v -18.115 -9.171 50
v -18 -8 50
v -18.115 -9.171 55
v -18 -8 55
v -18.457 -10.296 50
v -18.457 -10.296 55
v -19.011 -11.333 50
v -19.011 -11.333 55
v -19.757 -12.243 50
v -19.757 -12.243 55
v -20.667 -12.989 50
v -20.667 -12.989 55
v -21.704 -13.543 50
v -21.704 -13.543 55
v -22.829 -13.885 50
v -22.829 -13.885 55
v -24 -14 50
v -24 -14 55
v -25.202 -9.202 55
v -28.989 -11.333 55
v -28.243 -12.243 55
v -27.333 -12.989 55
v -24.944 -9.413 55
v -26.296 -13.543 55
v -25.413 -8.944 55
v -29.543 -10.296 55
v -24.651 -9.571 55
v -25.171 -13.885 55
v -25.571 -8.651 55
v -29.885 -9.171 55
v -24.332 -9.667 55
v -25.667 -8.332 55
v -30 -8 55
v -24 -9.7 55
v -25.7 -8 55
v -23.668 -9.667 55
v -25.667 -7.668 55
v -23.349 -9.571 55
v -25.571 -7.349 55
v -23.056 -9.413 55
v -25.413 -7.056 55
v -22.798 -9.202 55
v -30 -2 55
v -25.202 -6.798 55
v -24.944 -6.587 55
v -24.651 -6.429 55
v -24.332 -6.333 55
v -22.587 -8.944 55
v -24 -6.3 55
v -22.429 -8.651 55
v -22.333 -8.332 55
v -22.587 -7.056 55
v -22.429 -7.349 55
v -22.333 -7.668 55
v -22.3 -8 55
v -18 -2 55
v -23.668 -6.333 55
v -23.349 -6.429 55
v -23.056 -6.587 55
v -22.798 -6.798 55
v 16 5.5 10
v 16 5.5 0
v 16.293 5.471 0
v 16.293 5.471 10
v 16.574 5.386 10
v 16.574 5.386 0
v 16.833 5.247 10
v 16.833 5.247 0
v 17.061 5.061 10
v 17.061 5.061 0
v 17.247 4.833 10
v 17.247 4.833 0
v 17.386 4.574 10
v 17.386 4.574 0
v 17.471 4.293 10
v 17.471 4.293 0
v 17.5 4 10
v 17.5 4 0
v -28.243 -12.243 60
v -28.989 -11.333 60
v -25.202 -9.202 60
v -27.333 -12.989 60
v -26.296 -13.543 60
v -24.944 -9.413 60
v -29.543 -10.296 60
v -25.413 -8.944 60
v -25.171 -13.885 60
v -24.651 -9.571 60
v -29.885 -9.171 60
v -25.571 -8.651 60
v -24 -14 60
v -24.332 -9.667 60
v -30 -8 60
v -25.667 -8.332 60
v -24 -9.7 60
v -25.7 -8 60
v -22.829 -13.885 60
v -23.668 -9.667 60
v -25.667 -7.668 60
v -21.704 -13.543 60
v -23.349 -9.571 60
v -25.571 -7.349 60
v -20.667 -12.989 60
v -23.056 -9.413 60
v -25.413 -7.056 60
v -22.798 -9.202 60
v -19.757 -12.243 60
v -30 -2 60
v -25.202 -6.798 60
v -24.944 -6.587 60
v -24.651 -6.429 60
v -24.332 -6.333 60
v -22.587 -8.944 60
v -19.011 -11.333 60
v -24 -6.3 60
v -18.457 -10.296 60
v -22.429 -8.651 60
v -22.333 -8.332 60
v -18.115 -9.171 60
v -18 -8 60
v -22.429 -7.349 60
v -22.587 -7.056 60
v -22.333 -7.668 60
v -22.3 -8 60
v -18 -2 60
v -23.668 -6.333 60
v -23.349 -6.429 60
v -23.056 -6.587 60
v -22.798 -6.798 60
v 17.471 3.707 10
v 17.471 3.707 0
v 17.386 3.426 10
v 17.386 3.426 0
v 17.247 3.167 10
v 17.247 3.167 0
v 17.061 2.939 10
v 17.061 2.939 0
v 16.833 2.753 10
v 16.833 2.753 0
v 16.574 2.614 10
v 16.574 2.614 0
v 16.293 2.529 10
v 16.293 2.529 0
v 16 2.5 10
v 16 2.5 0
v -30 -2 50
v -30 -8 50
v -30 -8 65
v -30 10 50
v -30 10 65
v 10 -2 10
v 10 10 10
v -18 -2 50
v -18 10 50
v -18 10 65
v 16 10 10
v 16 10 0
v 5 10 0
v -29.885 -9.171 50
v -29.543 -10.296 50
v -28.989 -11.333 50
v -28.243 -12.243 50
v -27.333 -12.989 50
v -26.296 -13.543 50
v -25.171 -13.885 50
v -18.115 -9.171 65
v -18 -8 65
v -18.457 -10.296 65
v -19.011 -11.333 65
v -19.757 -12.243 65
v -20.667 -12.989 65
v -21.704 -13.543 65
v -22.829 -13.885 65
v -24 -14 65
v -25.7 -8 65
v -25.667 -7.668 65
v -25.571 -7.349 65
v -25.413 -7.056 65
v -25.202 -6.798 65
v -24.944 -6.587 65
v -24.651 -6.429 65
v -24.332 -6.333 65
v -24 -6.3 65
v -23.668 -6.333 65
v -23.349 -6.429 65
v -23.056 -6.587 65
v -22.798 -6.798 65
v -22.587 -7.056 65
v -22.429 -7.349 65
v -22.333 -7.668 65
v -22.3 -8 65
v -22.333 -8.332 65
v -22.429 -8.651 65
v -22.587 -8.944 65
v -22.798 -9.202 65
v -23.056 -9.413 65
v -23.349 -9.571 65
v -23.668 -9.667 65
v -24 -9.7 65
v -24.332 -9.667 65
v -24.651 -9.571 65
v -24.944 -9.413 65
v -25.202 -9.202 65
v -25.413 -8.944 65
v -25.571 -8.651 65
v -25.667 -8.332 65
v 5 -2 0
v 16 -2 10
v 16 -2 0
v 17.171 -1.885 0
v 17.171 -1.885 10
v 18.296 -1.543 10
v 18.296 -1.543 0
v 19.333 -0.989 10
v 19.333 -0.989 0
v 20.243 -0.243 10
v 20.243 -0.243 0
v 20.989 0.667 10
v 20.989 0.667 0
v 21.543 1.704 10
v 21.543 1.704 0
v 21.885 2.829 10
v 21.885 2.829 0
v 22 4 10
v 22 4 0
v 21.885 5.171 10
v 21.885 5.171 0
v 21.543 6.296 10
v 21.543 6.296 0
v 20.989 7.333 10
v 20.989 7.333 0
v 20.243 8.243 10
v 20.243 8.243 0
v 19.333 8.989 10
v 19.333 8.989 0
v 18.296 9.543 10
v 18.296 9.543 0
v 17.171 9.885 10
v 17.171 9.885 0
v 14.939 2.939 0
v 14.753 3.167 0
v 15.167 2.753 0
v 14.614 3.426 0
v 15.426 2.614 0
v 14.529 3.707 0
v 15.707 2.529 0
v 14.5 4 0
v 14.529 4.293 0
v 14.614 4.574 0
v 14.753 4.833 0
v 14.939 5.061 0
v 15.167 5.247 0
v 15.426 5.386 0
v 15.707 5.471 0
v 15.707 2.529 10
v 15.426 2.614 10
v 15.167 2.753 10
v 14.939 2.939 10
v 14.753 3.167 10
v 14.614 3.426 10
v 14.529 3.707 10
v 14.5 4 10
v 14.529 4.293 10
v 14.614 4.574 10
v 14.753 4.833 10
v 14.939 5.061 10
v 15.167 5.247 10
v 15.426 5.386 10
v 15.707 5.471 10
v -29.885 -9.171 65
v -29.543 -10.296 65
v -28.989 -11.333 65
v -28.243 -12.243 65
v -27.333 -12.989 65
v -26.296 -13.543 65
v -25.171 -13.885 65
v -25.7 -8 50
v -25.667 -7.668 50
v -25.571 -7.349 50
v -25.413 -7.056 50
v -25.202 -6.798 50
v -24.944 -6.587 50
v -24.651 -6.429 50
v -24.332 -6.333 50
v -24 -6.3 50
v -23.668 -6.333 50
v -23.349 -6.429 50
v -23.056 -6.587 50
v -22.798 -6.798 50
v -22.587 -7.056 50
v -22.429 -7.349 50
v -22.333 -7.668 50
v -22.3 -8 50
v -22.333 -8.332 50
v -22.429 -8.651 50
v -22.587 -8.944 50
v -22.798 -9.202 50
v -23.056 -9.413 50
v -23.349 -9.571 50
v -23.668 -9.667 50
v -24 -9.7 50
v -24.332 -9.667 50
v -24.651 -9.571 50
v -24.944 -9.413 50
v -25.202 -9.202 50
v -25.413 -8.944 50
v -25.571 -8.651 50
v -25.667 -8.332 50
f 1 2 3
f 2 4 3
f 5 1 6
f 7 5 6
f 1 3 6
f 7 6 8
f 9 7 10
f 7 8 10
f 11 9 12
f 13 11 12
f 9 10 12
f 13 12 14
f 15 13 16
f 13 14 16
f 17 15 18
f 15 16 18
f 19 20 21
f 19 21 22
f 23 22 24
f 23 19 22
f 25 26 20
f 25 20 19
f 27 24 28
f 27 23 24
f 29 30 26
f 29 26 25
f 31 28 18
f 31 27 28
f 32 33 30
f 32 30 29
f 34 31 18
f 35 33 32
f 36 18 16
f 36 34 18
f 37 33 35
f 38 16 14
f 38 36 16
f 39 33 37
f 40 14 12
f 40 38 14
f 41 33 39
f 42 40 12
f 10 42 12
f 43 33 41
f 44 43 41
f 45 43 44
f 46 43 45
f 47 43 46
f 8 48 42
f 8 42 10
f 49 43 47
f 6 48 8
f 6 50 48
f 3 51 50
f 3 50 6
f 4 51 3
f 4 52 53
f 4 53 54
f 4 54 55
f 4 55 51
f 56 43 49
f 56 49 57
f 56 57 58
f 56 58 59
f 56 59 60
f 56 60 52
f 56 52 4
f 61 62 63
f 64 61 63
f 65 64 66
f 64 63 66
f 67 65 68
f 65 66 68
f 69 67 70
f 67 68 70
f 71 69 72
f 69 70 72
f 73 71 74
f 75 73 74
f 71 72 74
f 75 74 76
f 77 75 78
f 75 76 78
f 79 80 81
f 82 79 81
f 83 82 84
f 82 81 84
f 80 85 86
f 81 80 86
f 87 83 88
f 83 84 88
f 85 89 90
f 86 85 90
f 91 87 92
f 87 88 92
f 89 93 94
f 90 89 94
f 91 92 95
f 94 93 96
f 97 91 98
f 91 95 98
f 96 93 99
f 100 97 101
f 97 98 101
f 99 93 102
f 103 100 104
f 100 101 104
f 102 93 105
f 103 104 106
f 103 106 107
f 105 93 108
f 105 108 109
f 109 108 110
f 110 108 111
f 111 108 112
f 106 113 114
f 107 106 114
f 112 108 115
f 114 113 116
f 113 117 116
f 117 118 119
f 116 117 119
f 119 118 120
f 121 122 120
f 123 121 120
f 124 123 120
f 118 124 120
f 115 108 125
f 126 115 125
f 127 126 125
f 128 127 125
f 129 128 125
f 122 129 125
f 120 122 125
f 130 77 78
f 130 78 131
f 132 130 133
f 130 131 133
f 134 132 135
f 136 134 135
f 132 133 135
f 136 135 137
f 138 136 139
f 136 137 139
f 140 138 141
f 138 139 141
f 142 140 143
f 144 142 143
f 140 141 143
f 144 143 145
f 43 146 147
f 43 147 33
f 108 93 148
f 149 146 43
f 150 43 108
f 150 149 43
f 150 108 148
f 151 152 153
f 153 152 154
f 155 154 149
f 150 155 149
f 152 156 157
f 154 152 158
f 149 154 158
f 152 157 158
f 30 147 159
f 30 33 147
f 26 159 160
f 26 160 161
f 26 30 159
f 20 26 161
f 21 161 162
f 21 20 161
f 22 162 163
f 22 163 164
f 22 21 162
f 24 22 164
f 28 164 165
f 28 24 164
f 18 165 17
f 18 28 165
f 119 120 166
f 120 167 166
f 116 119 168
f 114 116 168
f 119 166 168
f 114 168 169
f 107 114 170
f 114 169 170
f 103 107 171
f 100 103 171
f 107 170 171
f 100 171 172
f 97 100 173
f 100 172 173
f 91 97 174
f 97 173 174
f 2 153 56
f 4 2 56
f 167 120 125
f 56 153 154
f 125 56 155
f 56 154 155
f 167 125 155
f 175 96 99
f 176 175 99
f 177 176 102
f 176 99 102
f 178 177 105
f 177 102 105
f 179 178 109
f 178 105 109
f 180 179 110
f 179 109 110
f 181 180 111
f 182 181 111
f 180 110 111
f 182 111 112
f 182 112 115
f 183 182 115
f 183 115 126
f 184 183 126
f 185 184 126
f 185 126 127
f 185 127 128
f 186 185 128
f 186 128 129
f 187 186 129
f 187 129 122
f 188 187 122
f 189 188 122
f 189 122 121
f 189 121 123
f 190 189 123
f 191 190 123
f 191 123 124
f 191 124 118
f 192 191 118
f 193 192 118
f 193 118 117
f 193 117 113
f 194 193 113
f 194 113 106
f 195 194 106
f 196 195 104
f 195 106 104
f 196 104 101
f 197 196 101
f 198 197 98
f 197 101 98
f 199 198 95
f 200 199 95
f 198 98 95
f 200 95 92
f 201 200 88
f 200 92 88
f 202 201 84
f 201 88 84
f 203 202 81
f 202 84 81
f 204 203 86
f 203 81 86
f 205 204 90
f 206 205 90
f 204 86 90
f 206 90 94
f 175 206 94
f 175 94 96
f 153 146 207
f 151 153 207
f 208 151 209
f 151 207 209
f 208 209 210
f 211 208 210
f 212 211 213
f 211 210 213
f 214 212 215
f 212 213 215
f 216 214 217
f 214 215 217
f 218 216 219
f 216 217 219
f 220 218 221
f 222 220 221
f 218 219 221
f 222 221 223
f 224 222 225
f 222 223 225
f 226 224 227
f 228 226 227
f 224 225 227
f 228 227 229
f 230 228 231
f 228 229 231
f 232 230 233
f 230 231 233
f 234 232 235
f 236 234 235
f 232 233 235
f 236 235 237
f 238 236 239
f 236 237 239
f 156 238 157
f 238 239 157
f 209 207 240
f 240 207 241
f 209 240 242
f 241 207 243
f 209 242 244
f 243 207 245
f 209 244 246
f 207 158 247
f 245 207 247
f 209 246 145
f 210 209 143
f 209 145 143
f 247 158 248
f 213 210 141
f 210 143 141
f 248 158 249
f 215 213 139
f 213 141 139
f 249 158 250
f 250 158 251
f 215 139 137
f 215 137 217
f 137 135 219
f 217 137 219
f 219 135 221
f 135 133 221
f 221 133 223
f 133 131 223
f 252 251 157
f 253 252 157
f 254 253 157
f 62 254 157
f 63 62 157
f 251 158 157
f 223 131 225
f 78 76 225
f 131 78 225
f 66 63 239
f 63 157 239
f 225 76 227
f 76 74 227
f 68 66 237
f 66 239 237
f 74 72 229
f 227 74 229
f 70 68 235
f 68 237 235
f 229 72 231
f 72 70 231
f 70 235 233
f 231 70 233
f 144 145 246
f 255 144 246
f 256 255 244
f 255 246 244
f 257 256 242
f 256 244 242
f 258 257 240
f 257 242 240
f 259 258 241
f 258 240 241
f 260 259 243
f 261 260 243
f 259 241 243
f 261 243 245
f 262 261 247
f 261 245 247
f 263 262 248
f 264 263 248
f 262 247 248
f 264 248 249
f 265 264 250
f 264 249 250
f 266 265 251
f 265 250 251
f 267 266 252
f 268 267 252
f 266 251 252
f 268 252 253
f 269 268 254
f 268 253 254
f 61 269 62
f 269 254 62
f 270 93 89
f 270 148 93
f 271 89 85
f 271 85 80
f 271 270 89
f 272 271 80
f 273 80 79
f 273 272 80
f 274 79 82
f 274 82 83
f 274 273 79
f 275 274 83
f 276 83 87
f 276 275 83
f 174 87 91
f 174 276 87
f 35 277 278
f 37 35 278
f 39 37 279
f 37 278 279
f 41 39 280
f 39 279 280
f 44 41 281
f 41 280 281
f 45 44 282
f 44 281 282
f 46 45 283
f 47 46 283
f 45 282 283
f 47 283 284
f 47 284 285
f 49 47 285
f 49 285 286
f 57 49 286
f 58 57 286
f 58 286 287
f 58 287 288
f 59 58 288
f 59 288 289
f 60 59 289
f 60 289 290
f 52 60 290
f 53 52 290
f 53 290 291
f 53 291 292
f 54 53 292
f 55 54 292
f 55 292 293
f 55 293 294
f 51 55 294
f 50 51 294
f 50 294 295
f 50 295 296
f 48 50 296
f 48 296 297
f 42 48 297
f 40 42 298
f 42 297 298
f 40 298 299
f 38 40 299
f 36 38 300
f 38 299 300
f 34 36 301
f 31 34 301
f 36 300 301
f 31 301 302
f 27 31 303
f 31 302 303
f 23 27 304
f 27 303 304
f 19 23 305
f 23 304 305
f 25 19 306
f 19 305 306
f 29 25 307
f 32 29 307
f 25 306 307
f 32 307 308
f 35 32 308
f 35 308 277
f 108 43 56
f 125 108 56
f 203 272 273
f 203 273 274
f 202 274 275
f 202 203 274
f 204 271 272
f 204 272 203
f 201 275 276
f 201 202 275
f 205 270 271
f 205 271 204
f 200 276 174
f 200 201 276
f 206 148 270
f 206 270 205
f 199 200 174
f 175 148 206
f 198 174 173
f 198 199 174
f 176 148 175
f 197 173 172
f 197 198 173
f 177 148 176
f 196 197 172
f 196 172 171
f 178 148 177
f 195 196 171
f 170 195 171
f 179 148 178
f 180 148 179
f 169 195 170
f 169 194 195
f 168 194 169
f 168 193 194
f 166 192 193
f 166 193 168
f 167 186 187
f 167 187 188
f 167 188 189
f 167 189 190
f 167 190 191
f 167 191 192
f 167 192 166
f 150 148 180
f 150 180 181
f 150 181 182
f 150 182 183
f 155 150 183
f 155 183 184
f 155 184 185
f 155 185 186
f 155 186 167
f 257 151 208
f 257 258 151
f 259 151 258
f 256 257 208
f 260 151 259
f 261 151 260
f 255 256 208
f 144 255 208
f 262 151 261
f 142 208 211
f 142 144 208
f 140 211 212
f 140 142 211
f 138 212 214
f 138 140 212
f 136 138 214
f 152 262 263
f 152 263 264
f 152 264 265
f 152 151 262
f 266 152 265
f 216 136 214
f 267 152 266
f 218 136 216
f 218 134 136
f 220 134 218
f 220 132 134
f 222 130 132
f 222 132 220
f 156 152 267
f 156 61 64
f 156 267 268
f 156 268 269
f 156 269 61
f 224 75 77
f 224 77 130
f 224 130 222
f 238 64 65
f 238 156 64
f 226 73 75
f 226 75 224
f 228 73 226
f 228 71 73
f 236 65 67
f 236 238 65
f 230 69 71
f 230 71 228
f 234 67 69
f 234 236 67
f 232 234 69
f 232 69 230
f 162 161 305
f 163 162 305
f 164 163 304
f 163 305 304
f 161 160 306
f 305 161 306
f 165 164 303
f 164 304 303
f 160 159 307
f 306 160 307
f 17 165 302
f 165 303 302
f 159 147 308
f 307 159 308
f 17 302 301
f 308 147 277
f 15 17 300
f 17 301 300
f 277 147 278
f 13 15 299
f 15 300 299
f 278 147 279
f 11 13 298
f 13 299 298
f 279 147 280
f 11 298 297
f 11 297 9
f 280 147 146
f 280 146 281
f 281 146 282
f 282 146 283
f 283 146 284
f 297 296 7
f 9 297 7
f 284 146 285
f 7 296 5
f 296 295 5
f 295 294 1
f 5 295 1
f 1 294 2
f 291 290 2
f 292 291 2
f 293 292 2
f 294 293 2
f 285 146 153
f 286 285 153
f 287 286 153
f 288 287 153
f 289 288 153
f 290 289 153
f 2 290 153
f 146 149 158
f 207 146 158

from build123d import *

# Parameters (mm, degrees)
F1_DEPTH  = 20
F2_START  = 10
F1_FACE_R = 1.5
F2_DEPTH  = 10
F3_DEPTH  = 50
F5_DEPTH  = 12.001
F6_DEPTH  = 15
F7_W      = 12
F7_H      = 5
F8_DEPTH  = 12
F9_R      = 5.99999
F11_D     = 3.4


# Not quite as in the source:
# - a fillet or chamfer is up to 0.001 mm smaller than in the source, because OpenCascade refuses the exact size
# - a feature names something its author has since deleted; it is built from what else it names


with BuildPart() as f1:
    # F0 (on Top) → F1 (new body)
    with BuildSketch(Plane.XY):
        with BuildLine():
            ThreePointArc((16, -2), (22, 4), (16, 10))
            Line((16, 10), (16, 5.5))
            ThreePointArc((16, 5.5), (17.0606601718, 5.0606601718), (17.5, 4))
            ThreePointArc((17.5, 4), (17.0606601718, 2.9393398282), (16, 2.5))
            Line((16, 2.5), (16, -2))
        make_face()
        with BuildLine():
            Line((16, 5.5), (16, 10))
            ThreePointArc((16, 10), (11.7573593129, 8.2426406871), (10, 4))
            ThreePointArc((10, 4), (11.7573593129, -0.2426406871), (16, -2))
            Line((16, -2), (16, 2.5))
            ThreePointArc((16, 2.5), (14.5, 4), (16, 5.5))
        make_face()
        with BuildLine():
            Line((16, 10), (10, 10))
            Line((10, 10), (10, 4))
            ThreePointArc((10, 4), (11.7573593129, 8.2426406871), (16, 10))
        make_face()
        with BuildLine():
            ThreePointArc((16, -2), (11.7573593129, -0.2426406871), (10, 4))
            Line((10, 4), (10, -2))
            Line((10, -2), (16, -2))
        make_face()
    extrude(amount=F1_DEPTH)

    # F0 (on Top) + F1_face (on face) → F2 (cut)
    with BuildSketch(Plane.XY.offset(F2_START)):
        with BuildLine():
            ThreePointArc((16, -2), (22, 4), (16, 10))
            Line((16, 10), (16, 5.5))
            ThreePointArc((16, 5.5), (17.0606601718, 5.0606601718), (17.5, 4))
            ThreePointArc((17.5, 4), (17.0606601718, 2.9393398282), (16, 2.5))
            Line((16, 2.5), (16, -2))
        make_face()
        with BuildLine():
            Line((16, 5.5), (16, 10))
            ThreePointArc((16, 10), (11.7573593129, 8.2426406871), (10, 4))
            ThreePointArc((10, 4), (11.7573593129, -0.2426406871), (16, -2))
            Line((16, -2), (16, 2.5))
            ThreePointArc((16, 2.5), (14.5, 4), (16, 5.5))
        make_face()
        with BuildLine():
            ThreePointArc((16, -2), (11.7573593129, -0.2426406871), (10, 4))
            Line((10, 4), (10, -2))
            Line((10, -2), (16, -2))
        make_face()
        with BuildLine():
            Line((16, 10), (10, 10))
            Line((10, 10), (10, 4))
            ThreePointArc((10, 4), (11.7573593129, 8.2426406871), (16, 10))
        make_face()
    with BuildSketch(Plane(origin=(15.4073102565, 4, 20), x_dir=(1, 0, 0), z_dir=(0, 0, 1)).offset(F2_START)):
        with BuildLine():
            ThreePointArc((0.5926897435, -6), (6.5926897435, 0), (0.5926897435, 6))
            Line((0.5926897435, 6), (-5.4073102565, 6))
            Line((-5.4073102565, 6), (-5.4073102565, -6))
            Line((-5.4073102565, -6), (0.5926897435, -6))
        make_face()
        with Locations((0.5926897435, 0)):
            Circle(F1_FACE_R, mode=Mode.SUBTRACT)
    extrude(amount=F2_DEPTH, mode=Mode.SUBTRACT)

    # F0 (on Top) → F3 (join)
    with BuildSketch(Plane.XY):
        Polygon((10, 4), (10, 10), (-30, 10), (-30, -2), (10, -2), align=None)
    extrude(amount=F3_DEPTH)

    # F4 (on face) → F5 (cut, through all)
    with BuildSketch(Plane(origin=(0, 10, 0), x_dir=(-1, 0, 0), z_dir=(0, 1, 0))):
        Polygon((-10, 50), (-10, 10), (18, 50), align=None)
        Polygon((30, 0), (30, 50), (-5, 0), align=None)
    extrude(amount=-F5_DEPTH, mode=Mode.SUBTRACT)

    # F6 (add): a face of the model
    f6_faces = [f1.faces().sort_by_distance(p)[0] for p in [
        (-24, 4, 50),
    ]]
    extrude(f6_faces, amount=F6_DEPTH)

    # F7 (on face) → F8 (join)
    with BuildSketch(Plane.XZ.offset(2)):
        with Locations((-24, 52.5)):
            Rectangle(F7_W, F7_H)
        with Locations((-24, 62.5)):
            Rectangle(F7_W, F7_H)
    extrude(amount=F8_DEPTH)

    # F9 (radius 6 in the source; OpenCascade refuses exactly that, so slightly less here)
    f9_edges = [f1.edges().sort_by_distance(p)[0] for p in [
        (-30, -14, 62.5),
        (-18, -14, 62.5),
        (-18, -14, 52.5),
        (-30, -14, 52.5),
    ]]
    fillet(f9_edges, radius=F9_R)

    # F11 (through all)
    with Locations(Plane.XY.offset(65)):
        with Locations((-24, -8)):
            Hole(F11_D / 2)


solid = f1.part
